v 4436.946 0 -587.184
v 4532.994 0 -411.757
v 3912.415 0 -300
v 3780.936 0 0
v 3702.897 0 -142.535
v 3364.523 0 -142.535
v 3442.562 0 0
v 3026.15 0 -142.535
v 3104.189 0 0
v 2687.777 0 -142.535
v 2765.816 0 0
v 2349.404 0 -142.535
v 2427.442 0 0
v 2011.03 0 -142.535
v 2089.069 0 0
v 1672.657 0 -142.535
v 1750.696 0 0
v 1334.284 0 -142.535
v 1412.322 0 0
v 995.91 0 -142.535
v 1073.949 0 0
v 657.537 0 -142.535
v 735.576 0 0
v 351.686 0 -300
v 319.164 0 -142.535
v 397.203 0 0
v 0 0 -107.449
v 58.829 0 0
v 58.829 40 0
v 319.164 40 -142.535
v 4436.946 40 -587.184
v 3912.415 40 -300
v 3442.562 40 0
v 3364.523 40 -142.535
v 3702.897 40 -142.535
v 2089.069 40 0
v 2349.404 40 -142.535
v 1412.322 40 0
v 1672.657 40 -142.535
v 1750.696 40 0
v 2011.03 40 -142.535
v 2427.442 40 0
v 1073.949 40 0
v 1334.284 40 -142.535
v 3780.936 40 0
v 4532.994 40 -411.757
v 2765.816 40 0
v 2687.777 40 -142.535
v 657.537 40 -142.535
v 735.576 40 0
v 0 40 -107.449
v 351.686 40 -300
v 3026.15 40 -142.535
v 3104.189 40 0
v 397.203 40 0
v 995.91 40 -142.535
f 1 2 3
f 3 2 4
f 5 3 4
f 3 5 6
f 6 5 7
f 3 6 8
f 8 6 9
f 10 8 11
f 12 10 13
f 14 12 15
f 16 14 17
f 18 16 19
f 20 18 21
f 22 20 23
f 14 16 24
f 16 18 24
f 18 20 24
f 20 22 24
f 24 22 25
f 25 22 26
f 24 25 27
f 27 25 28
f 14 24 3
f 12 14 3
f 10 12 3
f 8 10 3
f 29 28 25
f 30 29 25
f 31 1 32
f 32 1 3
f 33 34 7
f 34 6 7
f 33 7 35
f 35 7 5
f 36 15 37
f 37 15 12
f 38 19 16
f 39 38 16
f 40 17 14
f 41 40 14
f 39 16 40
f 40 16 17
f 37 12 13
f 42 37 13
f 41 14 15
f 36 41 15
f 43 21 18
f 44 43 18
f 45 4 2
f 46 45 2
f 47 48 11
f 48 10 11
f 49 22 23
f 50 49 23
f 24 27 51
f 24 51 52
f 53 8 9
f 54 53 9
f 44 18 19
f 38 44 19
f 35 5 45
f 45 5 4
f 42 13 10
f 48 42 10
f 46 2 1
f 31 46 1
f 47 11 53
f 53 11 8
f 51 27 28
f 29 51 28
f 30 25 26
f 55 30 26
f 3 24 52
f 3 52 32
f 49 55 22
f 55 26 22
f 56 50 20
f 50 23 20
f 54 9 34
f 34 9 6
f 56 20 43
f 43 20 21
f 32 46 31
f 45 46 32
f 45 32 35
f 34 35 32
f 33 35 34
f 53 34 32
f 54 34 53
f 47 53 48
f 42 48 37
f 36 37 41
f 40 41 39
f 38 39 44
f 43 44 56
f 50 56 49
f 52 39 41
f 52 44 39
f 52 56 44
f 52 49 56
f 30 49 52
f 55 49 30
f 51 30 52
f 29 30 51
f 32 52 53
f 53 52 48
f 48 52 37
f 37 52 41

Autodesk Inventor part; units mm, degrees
ref_plane "YZ Plane" through (0, 0, 0) normal (1, 0, 0) x (0, 1, 0)
ref_plane "XZ Plane" through (0, 0, 0) normal (0, 1, 0) x (-1, 0, 0)
ref_plane "XY Plane" through (0, 0, 0) normal (0, 0, 1) x (1, 0, 0)
sketch "Эскиз1" plane through (0, 0, 0) normal (0, 1, 0) x (-1, 0, 0)
  line L0 (-351.6863, -300) -> (-3912.4146, -300)
  line L1 (-3780.9356, 0) -> (-397.2026, 0)
  line L2 (0, -107.4494) -> (-351.6863, -300)
  line L3 (0, -107.4494) -> (-58.8293, 0)
  line L4 (-58.8293, 0) -> (-319.1637, -142.5349)
  line L5 (-319.1637, -142.5349) -> (-397.2026, 0)
  line L6 (-397.2026, 0) -> (-657.537, -142.5349) construction
  line L7 (-657.537, -142.5349) -> (-319.1637, -142.5349) construction
  line L8 (-3780.9356, 0) -> (-4532.9935, -411.7568)
  line L9 (-4532.9935, -411.7568) -> (-4436.9457, -587.1843)
  line L10 (-4436.9457, -587.1843) -> (-3912.4146, -300)
  point P0 (0, 0)
  dimension "d0" = 300
  dimension "d4" = 162.5
  dimension "d5" = 296.8
  dimension "d6" = 338.3733
  dimension "Выс1" = 122.5
  dimension "Длина1" = 296.8
  dimension "Выс2" = 200
  dimension "Длина" = 3383.733
  dimension "Длина2" = 857.4
extrude "Выдавливание1" add sketch "Эскиз1" along normal blind 40
sketch "Эскиз2" plane through (0, 0, 0) normal (0, 1, 0) x (-1, 0, 0)
  line L0 (-397.2026, 0) -> (-3780.9356, 0) construction
  line L1 (-3780.9356, 0) -> (-4532.9935, -411.7568) construction
  line L2 (-4532.9935, -411.7568) -> (-4436.9457, -587.1843) construction
  line L3 (-4436.9457, -587.1843) -> (-3912.4146, -300) construction
  line L4 (-3912.4146, -300) -> (-351.6863, -300) construction
  line L5 (-351.6863, -300) -> (0, -107.4494) construction
  line L6 (0, -107.4494) -> (-58.8293, 0) construction
  line L7 (-58.8293, 0) -> (-319.1637, -142.5349) construction
  line L8 (-319.1637, -142.5349) -> (-397.2026, 0) construction
  line L9 (-397.2026, 0) -> (-657.537, -142.5349)
  line L10 (-657.537, -142.5349) -> (-735.5759, 0)
  line L11 (-735.5759, 0) -> (-397.2026, 0)
  point P0 (0, 0)
  dimension "d12" = 338.3733
extrude "Выдавливание2" cut sketch "Эскиз2" along normal through all
pattern_linear "Прямоуг.массив1" count 10 spacing 338.3733 along (1, 0, 0) of "Выдавливание2"
equation "\"d0\" = пШирКосоура"
equation "\"d4\" = пПодъем"
equation "\"d5\" = пХод"
equation "\"d6\" = пДиаг"
equation "\"Выс1\" = пПодъем - пТолПроступи"
equation "\"Длина1\" = пХод"
equation "\"Выс2\" = 0.666667 * пШирКосоура"
equation "\"Длина2\" = -пСвес + пДлПроступи + пОтступОтСтен - пТолПодступенка"
equation "\"d2\" = пТолКосоура"
equation "\"d12\" = пДиаг"
equation "\"d13\" = пТолКосоура"
equation "\"d17\" = пДиаг"
equation "\"пДлПроступи\" = 900"
equation "\"пПодъем\" = 162.5"
equation "\"пХод\" = 296.8"
equation "\"пЭффШаг\" = 621.8"
equation "\"пСвес\" = 30.2"
equation "\"пТолПроступи\" = 40"
equation "\"пТолКосоура\" = 40"
equation "\"пШирКосоура\" = 300"
equation "\"пОтступСтен\" = 5"
equation "\"пДиаг\" = 338.3733"
equation "\"пШирПроступи\" = 327"
equation "\"пТолПодступенка\" = 17.4"
equation "\"пГлубПаза\" = 12"
equation "\"пОтступОтСтен\" = 5"
equation "\"пТолПричала\" = 17.4"
equation "\"ДЛИНА\" = 4532.99348"
properties part number "Косоур-1" material "Ясень"
